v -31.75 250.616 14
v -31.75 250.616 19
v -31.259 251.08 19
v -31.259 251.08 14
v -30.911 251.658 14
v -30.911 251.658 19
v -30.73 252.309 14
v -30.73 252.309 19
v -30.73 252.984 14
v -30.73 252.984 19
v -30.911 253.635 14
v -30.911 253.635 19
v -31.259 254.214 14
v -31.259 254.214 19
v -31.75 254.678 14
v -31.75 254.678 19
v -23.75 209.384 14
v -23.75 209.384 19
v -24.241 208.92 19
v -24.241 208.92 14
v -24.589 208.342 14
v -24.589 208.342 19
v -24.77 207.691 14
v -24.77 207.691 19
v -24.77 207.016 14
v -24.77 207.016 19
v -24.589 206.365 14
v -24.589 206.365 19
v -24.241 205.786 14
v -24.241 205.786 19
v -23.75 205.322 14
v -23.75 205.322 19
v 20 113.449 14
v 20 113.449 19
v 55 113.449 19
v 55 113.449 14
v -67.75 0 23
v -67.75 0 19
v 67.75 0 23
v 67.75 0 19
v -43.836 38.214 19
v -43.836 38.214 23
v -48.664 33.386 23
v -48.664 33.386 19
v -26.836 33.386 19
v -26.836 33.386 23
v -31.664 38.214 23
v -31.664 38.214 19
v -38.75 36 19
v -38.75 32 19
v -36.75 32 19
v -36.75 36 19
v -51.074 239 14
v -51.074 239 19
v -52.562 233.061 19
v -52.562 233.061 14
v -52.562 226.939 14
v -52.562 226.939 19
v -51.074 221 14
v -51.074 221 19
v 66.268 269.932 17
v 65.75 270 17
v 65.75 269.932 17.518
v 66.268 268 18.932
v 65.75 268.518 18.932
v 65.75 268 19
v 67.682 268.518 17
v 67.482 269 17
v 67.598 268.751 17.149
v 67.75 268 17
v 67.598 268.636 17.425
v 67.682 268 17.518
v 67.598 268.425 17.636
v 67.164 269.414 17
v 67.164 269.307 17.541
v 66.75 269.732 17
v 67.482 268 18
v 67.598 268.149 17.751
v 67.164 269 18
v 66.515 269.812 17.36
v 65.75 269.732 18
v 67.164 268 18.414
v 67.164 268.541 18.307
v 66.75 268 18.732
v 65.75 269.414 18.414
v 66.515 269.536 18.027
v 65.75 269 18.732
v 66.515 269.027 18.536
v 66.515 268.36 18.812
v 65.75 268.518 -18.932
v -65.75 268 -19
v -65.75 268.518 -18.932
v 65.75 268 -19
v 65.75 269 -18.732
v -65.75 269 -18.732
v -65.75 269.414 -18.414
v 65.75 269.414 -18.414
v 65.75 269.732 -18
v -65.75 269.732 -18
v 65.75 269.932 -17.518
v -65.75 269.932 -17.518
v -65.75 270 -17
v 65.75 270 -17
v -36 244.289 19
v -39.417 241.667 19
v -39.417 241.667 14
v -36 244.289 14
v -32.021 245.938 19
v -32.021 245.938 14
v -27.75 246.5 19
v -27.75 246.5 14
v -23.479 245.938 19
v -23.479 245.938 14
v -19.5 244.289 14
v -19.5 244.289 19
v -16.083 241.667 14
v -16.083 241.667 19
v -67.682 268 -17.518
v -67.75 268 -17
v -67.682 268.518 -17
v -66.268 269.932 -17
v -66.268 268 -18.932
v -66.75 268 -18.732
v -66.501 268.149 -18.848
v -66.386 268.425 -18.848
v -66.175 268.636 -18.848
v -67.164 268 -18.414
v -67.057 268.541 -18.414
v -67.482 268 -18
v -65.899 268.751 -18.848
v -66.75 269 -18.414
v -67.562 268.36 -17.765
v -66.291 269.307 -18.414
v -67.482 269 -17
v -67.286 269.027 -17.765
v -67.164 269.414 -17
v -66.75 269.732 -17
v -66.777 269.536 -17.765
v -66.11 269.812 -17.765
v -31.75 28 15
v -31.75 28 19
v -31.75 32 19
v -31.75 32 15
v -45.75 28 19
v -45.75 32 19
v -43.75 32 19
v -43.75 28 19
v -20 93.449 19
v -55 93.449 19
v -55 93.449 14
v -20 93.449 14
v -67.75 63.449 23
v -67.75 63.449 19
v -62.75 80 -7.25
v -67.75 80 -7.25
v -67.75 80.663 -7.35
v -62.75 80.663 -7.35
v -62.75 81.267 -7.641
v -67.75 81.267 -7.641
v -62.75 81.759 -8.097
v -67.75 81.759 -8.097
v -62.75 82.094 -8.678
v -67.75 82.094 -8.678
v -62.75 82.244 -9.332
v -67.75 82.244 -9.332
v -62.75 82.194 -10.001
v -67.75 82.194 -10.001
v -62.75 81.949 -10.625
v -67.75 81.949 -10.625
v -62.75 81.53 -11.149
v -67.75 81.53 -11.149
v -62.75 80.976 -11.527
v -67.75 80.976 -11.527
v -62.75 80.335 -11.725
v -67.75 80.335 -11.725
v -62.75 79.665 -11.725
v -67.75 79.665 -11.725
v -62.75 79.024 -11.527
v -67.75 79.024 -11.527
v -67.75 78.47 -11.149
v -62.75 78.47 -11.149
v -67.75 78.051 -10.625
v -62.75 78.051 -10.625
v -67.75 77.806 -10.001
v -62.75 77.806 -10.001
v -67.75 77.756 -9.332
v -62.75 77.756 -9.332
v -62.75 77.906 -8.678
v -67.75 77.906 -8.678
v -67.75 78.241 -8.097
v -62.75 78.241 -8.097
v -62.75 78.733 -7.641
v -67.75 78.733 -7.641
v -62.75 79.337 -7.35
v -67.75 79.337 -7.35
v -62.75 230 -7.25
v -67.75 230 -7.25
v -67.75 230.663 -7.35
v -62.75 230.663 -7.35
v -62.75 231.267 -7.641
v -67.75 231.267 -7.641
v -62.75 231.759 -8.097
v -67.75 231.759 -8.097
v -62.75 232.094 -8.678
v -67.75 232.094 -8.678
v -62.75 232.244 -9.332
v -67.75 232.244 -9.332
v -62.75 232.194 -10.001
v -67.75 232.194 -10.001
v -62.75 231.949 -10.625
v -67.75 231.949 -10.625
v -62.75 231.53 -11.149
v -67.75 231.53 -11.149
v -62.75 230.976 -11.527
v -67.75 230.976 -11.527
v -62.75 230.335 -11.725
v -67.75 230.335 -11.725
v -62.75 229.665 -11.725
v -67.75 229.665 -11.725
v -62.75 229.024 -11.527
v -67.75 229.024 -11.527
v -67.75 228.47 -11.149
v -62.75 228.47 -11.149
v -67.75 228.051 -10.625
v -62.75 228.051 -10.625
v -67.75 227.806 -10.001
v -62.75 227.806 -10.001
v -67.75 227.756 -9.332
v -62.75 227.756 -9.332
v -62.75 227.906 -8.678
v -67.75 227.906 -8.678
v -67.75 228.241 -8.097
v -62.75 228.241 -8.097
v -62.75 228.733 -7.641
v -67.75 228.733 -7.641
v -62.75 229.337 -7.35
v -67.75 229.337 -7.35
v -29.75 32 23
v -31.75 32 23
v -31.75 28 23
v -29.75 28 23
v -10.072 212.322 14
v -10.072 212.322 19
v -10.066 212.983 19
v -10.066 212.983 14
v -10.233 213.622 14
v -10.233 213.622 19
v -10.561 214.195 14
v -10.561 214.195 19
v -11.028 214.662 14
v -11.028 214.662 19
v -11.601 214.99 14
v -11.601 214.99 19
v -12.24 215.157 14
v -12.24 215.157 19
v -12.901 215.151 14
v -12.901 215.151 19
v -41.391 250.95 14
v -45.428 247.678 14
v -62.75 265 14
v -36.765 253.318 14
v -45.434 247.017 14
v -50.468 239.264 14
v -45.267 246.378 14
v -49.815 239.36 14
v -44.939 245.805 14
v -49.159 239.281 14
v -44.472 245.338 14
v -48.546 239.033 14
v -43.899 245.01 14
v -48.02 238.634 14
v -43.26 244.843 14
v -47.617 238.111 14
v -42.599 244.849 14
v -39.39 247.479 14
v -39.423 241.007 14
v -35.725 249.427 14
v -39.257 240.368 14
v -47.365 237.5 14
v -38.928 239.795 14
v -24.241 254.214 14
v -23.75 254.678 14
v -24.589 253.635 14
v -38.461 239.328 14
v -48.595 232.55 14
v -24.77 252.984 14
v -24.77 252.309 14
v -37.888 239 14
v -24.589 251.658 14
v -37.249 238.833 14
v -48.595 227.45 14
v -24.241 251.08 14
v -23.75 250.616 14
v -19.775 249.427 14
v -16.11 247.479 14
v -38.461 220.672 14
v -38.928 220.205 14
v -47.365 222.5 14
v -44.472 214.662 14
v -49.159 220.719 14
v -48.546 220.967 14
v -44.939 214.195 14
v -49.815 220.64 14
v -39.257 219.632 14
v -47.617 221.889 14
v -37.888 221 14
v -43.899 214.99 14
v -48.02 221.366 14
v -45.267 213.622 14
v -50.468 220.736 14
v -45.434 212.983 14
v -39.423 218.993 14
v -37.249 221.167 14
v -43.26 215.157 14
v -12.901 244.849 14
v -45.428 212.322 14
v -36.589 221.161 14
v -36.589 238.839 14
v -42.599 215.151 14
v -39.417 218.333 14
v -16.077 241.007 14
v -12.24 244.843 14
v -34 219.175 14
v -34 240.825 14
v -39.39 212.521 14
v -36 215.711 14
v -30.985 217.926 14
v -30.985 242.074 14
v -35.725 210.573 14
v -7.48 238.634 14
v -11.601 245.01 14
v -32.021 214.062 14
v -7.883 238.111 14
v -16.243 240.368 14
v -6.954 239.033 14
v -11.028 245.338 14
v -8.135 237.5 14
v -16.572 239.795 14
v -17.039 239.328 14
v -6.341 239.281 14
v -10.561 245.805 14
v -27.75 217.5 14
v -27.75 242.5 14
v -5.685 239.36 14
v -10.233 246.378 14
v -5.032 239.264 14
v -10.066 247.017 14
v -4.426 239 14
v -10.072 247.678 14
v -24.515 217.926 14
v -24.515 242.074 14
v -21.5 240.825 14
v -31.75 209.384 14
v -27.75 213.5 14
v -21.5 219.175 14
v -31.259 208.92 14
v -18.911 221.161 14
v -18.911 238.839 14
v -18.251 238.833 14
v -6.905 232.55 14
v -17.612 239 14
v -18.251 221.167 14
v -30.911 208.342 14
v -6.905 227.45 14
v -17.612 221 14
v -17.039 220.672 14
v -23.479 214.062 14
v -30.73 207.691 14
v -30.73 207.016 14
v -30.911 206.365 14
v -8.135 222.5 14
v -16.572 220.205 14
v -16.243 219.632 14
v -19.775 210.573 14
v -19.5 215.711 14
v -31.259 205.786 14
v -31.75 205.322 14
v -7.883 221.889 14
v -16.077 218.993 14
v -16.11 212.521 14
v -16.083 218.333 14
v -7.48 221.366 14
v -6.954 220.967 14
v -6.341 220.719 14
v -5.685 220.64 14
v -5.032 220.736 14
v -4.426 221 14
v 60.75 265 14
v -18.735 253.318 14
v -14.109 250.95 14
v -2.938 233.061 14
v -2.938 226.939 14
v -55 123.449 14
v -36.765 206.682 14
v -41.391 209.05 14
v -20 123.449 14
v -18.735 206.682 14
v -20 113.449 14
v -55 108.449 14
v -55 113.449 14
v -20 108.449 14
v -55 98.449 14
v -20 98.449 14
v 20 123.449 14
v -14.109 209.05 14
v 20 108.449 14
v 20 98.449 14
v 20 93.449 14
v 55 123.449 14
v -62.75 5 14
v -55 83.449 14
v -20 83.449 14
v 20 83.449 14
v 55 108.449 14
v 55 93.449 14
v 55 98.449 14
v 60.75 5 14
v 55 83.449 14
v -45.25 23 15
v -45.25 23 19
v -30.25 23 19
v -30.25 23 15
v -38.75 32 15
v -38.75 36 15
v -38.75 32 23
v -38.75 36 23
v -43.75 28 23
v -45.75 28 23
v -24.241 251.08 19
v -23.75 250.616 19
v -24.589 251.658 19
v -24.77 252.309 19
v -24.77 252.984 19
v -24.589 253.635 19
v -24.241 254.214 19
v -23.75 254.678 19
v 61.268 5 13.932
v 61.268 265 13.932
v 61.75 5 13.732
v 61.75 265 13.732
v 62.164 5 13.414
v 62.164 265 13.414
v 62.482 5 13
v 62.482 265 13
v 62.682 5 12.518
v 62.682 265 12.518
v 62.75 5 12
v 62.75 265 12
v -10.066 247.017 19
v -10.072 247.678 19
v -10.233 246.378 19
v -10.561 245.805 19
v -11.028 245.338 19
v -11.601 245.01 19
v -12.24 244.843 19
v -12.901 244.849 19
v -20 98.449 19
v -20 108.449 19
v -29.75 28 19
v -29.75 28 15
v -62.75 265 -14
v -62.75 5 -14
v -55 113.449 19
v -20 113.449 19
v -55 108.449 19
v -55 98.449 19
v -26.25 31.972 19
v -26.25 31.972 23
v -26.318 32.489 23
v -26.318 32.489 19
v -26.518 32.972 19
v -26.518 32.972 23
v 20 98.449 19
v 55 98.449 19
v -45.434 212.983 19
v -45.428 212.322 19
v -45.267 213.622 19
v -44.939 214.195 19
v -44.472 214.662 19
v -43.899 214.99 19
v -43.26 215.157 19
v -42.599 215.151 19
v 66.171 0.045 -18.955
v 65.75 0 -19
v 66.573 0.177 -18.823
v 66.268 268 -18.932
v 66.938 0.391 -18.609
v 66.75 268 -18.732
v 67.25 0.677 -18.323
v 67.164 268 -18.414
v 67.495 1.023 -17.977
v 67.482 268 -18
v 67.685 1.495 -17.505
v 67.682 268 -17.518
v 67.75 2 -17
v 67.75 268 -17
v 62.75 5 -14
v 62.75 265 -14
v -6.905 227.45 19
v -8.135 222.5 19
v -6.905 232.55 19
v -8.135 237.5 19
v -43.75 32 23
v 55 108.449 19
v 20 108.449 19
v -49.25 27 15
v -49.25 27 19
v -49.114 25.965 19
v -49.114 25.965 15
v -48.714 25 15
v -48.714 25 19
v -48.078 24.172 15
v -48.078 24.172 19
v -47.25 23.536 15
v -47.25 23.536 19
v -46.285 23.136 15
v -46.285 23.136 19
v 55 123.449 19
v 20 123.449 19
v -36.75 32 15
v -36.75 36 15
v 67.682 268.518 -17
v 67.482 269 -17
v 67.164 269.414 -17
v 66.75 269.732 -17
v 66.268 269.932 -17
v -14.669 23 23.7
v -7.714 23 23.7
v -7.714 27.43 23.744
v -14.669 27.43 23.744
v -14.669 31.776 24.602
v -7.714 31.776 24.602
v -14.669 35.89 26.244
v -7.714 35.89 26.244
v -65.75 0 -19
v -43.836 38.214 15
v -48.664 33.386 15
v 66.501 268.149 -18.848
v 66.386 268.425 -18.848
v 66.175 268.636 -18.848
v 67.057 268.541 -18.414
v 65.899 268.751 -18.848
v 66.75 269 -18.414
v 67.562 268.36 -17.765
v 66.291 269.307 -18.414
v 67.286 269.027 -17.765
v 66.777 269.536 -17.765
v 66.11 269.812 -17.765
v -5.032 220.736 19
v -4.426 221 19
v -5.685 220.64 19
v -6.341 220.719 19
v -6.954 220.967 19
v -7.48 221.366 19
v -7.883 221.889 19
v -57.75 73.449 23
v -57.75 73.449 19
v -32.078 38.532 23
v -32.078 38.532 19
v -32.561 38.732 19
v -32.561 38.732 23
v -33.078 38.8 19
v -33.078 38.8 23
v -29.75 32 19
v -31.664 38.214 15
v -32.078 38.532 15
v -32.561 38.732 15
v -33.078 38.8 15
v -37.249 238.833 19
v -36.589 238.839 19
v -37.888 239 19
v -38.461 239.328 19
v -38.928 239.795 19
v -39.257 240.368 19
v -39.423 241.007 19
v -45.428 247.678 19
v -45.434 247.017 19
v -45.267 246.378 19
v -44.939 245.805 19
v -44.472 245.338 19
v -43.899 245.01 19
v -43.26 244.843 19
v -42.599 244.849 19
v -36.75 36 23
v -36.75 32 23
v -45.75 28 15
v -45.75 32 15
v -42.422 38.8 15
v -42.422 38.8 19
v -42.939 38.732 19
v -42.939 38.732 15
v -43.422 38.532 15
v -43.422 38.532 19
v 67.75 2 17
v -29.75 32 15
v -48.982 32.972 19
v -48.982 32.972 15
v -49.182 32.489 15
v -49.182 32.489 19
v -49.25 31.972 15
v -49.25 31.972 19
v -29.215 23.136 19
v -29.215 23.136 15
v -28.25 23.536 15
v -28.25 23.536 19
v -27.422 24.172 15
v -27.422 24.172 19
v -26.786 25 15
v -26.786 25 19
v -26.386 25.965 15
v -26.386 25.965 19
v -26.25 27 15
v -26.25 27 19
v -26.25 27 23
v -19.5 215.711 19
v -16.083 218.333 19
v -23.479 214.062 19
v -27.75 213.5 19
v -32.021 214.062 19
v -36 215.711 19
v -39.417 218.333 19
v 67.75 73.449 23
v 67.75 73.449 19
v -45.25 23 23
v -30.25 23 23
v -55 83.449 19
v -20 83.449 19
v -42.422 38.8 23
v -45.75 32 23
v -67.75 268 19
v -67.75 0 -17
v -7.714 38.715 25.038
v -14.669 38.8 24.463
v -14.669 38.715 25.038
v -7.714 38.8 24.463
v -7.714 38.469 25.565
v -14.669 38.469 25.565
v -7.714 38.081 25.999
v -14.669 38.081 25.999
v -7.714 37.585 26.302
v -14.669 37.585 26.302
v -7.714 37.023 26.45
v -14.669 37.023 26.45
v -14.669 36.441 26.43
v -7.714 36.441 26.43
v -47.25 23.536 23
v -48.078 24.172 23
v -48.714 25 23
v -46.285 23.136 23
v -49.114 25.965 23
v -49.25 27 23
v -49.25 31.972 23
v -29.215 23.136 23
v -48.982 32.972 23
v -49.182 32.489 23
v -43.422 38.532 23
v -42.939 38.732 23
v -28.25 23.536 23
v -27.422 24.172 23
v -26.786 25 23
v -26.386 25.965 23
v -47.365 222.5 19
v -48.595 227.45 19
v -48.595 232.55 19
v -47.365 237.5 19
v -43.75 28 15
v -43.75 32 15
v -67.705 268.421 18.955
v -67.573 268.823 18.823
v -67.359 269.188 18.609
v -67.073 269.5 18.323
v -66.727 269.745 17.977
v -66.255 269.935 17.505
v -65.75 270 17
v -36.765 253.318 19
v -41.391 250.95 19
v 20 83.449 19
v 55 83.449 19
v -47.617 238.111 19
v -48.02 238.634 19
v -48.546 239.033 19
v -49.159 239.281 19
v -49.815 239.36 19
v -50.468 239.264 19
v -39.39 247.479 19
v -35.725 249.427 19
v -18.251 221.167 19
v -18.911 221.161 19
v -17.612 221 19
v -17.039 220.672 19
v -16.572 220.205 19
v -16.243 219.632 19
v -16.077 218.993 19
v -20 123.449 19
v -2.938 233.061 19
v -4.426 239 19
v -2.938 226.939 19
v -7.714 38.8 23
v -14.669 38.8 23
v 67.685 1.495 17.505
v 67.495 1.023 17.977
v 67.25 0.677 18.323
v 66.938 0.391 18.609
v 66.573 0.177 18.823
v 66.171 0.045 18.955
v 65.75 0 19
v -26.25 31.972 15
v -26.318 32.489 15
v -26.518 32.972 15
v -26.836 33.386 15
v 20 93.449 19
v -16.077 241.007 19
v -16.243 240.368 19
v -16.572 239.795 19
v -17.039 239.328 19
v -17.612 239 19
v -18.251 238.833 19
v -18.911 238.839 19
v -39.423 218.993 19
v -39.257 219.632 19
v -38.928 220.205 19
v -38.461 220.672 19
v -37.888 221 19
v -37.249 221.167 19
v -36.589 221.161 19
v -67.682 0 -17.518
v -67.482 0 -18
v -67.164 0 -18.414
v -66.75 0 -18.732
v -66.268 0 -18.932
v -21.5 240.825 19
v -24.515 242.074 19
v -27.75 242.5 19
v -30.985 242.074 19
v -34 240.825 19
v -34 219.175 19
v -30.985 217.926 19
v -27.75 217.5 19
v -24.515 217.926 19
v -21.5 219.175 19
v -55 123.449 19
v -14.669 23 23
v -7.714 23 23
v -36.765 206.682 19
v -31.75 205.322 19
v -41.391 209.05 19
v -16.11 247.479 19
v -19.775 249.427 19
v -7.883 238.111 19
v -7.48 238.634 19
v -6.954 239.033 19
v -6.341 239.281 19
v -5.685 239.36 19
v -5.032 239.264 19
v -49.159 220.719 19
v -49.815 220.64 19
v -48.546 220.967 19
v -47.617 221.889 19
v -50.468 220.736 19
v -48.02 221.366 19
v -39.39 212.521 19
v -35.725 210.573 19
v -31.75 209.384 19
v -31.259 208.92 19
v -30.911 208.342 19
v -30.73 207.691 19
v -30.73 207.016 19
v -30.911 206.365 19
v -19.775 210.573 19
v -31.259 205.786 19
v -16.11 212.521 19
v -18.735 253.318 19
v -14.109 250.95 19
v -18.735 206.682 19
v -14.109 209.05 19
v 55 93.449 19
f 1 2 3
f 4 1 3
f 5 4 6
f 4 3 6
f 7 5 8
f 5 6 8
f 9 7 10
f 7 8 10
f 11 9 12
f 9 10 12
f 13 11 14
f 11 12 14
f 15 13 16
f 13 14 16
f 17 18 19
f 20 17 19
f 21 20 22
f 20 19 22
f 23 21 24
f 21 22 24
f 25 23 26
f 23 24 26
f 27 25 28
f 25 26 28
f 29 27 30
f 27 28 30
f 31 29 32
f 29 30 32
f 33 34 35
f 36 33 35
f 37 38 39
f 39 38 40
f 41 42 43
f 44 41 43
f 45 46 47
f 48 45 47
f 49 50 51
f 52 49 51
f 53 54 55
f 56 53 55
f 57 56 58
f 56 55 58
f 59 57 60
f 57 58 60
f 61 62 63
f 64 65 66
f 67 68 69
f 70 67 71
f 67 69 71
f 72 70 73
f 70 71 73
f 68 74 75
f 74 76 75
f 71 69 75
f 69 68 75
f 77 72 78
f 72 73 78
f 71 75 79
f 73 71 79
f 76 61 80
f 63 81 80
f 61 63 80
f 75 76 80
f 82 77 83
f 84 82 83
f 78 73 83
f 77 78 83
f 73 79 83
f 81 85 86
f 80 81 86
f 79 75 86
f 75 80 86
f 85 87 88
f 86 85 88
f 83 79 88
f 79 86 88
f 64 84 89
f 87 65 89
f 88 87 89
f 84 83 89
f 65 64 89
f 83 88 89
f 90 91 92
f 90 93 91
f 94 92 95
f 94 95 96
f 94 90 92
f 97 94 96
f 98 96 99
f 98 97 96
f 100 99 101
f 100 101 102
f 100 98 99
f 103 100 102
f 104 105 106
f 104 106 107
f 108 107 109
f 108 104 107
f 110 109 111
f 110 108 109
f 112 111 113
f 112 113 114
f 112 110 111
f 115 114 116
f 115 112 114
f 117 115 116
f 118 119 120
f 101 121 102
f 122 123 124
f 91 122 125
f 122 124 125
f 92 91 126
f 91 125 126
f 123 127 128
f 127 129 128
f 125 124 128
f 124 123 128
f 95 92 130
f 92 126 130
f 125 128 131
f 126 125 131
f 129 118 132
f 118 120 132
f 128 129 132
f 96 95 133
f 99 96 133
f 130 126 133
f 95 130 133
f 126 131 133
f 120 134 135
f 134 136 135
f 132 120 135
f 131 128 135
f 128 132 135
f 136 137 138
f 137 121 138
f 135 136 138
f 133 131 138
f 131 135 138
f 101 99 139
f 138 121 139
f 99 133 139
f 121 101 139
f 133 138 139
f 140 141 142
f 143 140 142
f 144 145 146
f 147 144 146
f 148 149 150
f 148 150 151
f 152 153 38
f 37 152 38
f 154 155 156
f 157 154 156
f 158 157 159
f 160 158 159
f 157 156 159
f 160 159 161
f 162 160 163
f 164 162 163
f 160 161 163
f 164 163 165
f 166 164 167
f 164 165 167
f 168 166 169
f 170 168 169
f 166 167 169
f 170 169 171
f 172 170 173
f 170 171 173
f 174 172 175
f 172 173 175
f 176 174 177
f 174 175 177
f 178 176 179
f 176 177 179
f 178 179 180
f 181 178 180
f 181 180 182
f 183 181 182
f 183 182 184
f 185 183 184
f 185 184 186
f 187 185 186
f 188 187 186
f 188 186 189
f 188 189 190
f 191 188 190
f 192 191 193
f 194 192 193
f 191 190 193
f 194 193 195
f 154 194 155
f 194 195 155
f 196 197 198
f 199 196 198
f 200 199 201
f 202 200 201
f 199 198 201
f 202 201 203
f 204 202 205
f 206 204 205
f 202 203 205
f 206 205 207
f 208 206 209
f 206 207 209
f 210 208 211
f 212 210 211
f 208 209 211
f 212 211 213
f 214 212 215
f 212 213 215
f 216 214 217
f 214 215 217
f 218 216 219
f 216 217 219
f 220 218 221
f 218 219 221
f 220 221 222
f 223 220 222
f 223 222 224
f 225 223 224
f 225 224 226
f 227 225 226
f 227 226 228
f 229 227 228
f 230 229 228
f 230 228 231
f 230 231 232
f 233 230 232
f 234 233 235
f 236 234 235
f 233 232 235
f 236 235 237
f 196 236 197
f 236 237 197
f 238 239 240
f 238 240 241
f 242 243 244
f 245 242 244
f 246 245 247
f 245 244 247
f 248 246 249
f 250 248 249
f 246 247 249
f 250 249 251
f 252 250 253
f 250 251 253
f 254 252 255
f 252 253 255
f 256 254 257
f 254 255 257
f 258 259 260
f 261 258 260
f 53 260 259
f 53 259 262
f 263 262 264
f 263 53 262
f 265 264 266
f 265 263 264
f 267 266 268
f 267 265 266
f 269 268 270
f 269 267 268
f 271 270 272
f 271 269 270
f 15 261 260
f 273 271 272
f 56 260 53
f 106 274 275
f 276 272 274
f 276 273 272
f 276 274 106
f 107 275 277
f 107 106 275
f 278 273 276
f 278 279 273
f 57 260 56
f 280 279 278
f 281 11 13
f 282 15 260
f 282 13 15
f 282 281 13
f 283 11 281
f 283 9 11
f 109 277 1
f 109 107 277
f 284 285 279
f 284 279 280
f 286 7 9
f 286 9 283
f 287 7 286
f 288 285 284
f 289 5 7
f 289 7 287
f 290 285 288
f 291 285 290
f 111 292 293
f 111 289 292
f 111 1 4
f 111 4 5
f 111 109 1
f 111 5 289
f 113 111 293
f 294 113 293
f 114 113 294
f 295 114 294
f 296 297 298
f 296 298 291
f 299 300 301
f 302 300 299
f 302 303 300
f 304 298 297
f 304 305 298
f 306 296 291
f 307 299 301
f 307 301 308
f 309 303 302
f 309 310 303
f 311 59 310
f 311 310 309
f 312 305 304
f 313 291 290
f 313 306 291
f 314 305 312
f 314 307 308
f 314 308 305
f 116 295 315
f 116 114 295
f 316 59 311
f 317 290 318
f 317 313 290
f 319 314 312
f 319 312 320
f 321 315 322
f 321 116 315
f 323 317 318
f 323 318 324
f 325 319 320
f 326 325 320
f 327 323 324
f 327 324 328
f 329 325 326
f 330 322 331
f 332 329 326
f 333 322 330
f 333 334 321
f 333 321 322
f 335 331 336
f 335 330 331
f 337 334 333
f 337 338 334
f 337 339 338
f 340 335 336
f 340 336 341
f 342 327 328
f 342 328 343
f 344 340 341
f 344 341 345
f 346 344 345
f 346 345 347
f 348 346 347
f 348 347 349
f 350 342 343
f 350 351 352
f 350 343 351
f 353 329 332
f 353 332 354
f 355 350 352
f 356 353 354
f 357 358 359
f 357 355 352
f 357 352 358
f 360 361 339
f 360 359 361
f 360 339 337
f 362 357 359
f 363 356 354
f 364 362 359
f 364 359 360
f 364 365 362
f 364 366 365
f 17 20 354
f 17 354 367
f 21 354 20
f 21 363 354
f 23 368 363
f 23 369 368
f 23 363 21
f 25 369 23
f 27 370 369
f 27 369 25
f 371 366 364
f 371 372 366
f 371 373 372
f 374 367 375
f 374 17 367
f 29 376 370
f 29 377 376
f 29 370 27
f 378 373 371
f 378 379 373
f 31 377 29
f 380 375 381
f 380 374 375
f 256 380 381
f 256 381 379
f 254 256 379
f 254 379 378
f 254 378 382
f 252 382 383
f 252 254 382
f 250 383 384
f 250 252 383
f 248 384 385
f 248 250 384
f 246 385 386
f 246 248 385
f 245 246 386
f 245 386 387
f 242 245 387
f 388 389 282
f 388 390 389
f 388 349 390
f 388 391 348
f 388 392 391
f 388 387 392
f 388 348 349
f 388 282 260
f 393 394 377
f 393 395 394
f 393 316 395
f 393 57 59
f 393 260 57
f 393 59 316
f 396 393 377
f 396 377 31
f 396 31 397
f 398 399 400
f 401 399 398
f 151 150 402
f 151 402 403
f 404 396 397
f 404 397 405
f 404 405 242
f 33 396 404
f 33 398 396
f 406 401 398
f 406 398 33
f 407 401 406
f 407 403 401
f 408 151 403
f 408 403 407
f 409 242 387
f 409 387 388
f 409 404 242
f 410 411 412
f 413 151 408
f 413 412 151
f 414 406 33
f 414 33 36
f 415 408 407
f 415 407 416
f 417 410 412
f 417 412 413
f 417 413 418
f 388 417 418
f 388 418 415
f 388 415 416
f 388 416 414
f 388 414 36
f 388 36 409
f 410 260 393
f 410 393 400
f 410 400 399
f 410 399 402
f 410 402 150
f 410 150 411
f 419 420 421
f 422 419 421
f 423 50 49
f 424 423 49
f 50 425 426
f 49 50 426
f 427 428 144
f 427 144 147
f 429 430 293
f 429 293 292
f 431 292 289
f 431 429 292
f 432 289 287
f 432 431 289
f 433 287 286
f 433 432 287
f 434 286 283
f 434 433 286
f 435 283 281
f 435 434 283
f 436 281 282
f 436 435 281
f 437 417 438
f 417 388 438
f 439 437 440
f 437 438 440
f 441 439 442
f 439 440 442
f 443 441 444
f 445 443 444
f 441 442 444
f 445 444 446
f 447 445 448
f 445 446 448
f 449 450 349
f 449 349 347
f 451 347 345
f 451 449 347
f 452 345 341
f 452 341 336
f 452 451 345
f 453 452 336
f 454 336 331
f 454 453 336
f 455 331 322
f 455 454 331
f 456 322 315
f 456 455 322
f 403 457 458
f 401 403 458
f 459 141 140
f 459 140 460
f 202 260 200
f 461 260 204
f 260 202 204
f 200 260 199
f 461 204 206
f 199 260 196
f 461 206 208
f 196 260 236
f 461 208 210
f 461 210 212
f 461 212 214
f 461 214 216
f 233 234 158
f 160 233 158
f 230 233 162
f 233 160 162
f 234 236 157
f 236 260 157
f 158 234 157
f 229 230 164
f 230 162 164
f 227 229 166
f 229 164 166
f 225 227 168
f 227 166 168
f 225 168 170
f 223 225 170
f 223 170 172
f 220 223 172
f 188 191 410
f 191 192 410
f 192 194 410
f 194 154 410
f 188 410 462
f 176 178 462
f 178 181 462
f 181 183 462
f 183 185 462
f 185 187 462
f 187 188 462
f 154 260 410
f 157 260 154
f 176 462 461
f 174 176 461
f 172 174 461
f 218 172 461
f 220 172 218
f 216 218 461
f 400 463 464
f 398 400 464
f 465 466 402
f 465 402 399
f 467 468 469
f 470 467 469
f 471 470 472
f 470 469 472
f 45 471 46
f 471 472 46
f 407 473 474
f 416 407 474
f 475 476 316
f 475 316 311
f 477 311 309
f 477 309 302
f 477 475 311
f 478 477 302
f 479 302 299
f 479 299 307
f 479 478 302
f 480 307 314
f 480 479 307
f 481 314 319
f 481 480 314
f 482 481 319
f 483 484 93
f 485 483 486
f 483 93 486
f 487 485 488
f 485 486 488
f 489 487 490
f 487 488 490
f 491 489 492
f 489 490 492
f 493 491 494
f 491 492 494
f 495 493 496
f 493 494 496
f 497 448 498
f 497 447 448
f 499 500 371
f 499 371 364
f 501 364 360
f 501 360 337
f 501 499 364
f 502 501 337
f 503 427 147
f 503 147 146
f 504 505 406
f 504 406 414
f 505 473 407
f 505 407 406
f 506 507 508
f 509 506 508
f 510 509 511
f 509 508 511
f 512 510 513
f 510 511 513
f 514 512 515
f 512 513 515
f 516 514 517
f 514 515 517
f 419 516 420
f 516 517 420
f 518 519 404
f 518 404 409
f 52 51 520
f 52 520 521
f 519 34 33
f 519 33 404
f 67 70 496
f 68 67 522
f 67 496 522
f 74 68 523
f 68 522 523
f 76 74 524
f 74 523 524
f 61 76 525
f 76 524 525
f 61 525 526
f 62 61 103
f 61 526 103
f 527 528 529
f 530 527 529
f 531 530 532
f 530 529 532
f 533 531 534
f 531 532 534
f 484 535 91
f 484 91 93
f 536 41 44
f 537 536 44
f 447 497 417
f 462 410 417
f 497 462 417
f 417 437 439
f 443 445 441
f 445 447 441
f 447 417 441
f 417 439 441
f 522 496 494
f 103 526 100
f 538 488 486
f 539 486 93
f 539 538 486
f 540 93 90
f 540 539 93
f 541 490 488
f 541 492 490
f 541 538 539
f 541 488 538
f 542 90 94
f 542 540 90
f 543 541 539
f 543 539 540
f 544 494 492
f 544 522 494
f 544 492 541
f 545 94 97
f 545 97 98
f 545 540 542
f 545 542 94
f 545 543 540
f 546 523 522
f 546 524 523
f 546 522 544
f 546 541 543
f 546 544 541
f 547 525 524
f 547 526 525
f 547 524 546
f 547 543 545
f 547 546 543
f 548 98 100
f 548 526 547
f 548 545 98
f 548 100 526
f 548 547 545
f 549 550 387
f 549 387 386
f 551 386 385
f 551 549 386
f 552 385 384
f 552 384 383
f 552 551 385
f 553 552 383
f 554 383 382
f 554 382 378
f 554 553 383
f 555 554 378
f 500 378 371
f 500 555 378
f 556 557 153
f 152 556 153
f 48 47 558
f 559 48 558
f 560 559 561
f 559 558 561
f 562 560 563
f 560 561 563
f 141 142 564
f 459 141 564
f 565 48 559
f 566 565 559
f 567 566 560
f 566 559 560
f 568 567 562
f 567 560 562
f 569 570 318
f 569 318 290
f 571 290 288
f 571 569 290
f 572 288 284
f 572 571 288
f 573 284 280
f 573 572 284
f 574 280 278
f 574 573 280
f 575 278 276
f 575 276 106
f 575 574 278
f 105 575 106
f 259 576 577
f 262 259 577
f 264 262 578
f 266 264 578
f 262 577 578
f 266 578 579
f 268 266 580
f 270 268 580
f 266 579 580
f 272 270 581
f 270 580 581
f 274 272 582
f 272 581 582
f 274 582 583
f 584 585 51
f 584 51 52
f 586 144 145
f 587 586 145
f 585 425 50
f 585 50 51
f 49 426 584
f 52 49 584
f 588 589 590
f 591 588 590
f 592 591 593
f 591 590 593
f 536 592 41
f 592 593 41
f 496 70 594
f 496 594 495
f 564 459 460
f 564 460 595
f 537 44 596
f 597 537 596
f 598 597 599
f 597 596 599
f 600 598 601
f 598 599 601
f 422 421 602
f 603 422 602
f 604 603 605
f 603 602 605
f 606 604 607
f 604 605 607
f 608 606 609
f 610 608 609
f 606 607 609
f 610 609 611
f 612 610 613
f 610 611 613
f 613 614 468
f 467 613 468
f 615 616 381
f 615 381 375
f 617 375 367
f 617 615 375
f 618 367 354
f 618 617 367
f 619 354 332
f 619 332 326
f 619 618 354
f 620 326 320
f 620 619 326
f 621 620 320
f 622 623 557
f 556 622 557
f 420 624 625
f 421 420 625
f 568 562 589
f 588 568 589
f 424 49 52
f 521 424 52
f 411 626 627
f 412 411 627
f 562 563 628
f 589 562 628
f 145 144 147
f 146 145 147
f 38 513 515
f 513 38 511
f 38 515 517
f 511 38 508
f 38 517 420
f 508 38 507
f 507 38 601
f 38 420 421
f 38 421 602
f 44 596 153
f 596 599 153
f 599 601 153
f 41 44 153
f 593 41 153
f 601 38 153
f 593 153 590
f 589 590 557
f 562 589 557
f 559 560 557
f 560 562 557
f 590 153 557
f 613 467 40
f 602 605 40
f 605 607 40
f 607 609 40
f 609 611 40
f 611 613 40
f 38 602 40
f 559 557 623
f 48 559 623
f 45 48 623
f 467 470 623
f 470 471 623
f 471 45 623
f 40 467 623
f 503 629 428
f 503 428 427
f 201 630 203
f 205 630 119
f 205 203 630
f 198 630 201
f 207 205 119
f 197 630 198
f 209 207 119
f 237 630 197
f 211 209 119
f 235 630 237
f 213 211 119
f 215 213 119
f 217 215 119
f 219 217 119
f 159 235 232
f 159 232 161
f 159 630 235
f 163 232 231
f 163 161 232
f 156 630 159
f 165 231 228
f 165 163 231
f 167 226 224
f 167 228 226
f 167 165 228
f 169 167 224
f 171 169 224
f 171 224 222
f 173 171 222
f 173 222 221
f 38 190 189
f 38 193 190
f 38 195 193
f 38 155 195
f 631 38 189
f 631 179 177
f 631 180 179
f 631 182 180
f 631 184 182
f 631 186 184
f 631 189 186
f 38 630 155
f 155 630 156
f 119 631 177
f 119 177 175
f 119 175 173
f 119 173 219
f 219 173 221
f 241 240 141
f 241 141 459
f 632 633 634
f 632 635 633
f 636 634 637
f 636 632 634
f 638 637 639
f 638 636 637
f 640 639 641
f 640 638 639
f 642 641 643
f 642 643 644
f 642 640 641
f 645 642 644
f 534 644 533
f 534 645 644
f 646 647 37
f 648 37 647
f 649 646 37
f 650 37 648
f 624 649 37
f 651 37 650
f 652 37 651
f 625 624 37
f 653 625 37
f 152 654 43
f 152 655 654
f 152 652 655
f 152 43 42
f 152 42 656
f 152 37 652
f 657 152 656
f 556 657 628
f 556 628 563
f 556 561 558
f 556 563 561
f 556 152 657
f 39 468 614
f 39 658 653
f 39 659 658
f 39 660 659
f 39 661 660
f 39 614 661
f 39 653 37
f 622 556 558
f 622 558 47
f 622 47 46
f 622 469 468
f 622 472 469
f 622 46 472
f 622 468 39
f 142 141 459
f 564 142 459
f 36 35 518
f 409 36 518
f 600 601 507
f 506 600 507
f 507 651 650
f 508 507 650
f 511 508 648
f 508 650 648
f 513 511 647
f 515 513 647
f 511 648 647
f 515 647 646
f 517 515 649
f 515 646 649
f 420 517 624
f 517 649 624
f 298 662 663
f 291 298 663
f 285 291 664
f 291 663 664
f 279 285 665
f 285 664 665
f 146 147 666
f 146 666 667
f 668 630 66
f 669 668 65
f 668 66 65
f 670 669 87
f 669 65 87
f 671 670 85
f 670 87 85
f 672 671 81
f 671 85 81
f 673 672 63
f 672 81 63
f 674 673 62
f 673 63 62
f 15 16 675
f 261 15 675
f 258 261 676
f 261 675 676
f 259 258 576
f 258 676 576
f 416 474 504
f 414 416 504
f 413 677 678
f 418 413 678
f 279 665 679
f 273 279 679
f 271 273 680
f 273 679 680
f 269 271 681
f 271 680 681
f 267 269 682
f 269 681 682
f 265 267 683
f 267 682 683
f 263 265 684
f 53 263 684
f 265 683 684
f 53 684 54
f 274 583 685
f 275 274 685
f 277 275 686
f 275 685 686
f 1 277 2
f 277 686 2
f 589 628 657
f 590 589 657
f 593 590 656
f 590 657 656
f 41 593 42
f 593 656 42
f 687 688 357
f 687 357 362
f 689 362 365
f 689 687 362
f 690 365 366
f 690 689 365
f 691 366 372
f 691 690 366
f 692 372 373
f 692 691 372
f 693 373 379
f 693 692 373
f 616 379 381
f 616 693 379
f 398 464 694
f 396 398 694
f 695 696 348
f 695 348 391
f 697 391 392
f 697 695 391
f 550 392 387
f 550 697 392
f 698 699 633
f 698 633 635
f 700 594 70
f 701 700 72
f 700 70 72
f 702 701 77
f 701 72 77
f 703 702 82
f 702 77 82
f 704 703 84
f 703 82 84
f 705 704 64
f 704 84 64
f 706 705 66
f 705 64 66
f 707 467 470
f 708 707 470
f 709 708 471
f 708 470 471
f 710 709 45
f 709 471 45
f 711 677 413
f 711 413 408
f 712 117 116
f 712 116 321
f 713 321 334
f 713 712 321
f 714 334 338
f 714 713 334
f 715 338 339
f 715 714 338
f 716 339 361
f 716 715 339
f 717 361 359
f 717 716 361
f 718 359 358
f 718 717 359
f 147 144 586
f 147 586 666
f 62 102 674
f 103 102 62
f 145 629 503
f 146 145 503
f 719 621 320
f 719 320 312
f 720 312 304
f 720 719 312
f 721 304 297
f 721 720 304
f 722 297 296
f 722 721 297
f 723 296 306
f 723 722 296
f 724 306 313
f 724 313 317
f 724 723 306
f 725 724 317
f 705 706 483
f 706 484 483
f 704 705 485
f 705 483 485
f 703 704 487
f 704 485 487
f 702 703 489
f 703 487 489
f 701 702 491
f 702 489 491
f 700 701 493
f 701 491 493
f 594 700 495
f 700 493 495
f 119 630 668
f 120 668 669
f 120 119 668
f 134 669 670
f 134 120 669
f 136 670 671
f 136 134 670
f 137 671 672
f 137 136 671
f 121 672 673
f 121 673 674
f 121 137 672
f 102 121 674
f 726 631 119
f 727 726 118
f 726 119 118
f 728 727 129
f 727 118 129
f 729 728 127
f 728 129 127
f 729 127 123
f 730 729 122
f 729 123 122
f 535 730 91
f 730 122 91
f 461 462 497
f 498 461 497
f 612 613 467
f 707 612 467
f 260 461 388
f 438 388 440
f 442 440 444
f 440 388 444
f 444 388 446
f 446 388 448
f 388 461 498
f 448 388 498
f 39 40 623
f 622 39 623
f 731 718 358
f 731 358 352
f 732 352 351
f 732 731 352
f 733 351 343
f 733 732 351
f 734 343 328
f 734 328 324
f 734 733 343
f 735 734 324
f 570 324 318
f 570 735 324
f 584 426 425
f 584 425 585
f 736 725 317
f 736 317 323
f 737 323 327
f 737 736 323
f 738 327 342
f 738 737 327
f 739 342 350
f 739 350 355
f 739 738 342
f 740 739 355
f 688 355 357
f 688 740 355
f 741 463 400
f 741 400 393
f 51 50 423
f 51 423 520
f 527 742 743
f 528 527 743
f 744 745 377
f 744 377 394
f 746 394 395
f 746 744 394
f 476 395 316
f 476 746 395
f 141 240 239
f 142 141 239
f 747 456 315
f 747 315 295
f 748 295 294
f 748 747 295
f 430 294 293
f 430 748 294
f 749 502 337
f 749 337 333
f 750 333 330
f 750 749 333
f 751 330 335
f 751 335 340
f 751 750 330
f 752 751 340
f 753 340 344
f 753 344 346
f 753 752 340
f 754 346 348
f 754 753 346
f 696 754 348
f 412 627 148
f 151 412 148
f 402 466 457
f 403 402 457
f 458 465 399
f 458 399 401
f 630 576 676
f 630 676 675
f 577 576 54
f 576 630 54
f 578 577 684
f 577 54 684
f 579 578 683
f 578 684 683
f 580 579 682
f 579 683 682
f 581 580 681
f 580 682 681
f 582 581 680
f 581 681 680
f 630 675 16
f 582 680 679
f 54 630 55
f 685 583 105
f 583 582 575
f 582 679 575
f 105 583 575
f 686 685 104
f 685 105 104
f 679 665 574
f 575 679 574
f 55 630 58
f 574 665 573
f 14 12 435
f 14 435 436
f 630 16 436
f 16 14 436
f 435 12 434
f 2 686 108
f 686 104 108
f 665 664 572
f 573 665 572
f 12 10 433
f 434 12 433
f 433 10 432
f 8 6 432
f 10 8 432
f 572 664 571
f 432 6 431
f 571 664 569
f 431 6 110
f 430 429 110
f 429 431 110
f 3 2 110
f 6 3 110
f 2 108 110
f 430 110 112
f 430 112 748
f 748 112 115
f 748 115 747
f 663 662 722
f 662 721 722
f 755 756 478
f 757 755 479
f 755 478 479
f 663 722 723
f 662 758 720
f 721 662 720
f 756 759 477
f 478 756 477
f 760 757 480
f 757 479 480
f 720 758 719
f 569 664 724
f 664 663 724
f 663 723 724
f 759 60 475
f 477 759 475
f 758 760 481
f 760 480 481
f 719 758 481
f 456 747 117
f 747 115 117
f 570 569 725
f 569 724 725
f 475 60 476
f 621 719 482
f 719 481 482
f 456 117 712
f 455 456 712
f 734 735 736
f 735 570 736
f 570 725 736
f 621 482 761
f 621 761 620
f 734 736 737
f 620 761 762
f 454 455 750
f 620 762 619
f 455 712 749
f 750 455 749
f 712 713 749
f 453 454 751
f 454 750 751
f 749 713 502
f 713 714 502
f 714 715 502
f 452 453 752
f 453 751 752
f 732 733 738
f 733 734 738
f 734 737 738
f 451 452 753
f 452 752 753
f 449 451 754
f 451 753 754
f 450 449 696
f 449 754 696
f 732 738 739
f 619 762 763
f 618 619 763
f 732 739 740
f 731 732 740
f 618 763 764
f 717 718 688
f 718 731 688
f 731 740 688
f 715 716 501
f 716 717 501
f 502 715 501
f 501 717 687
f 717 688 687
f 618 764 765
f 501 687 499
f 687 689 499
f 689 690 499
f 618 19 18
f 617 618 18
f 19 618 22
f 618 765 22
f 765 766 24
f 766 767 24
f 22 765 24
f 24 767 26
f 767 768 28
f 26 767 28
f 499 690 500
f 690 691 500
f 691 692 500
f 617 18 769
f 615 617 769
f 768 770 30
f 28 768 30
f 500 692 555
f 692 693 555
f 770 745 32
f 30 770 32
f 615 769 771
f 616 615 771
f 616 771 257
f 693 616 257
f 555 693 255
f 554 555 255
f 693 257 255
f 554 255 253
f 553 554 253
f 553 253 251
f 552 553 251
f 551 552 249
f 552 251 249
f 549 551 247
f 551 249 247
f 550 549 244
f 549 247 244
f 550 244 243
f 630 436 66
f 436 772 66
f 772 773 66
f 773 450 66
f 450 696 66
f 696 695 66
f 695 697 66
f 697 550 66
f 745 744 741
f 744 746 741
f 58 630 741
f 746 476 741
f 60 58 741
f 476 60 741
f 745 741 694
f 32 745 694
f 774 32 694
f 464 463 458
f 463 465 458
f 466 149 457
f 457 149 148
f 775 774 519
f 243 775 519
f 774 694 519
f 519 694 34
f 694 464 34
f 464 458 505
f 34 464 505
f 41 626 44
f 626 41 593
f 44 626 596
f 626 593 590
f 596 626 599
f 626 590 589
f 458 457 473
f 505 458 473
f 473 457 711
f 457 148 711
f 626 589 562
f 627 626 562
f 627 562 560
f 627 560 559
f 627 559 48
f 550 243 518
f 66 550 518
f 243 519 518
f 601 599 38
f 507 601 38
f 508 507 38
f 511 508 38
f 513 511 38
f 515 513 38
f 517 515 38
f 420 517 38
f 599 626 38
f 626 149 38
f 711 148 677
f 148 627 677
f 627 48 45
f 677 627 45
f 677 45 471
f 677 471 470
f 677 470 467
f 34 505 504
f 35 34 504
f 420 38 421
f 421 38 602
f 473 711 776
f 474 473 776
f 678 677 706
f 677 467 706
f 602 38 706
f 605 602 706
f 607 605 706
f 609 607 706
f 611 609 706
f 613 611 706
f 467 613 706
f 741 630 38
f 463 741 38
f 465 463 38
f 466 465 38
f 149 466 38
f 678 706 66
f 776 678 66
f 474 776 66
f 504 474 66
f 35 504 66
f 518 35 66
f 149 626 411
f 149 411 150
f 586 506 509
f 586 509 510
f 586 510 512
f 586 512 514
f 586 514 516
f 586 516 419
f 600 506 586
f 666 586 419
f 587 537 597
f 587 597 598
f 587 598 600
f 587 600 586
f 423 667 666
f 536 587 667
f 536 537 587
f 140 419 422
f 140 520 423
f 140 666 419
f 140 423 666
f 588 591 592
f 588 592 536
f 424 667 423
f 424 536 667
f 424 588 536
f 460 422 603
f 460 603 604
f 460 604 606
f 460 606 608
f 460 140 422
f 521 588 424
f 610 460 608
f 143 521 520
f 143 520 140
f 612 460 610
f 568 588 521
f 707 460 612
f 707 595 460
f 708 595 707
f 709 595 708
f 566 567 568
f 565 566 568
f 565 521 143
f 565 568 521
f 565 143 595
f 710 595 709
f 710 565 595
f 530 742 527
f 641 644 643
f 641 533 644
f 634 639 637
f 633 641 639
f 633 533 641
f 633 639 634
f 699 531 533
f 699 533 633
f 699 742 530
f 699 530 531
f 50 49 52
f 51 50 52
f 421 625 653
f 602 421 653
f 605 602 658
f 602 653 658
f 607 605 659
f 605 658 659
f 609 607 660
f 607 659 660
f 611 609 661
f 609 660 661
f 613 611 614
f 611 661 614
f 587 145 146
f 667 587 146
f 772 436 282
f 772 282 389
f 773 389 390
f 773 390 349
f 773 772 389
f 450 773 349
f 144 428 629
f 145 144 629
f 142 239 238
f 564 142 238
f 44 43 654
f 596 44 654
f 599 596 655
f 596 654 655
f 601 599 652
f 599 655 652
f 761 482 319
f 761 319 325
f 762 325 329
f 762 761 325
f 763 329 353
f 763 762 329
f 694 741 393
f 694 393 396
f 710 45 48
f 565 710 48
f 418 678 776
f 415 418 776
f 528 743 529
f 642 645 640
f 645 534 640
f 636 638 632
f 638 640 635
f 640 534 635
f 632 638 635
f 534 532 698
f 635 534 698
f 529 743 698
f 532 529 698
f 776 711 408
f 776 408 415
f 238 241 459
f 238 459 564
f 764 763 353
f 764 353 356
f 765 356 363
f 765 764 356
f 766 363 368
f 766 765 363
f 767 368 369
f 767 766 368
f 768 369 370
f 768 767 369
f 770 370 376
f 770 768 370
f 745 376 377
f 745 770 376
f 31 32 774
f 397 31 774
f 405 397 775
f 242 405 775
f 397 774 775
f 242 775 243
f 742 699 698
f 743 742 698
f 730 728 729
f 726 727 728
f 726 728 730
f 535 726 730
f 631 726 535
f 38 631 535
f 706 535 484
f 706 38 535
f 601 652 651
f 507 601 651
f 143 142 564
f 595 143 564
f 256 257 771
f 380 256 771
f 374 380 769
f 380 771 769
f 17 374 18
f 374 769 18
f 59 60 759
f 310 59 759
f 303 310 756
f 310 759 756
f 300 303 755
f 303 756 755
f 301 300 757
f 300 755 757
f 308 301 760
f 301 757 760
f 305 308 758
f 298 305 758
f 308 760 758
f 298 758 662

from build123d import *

# Parameters (mm, degrees)
SKETCH1_W           = 135.5
SKETCH1_H           = 38
BOSS_EXTRUDE1_DEPTH = 270
BOSS_EXTRUDE2_DEPTH = 4
SHELL2_T            = -5
SKETCH4_W           = 125.5
SKETCH4_H           = 28
BOSS_EXTRUDE3_DEPTH = 5
CUT_EXTRUDE1_DEPTH  = 5
CUT_EXTRUDE2_DEPTH  = 5
SKETCH7_W           = 35
SKETCH7_H           = 10
CUT_EXTRUDE3_DEPTH  = 5
FILLET1_R           = 2
SKETCH8_W           = 2
SKETCH8_H           = 4
CUT_EXTRUDE4_DEPTH  = 8
SKETCH9_W           = 6.95582013
SKETCH9_H           = 15.8
BOSS_EXTRUDE5_DEPTH = 5
SKETCH11_R          = 2.25
CUT_EXTRUDE6_DEPTH  = 5
CUT_EXTRUDE7_DEPTH  = 282.742345704
FILLET2_R           = 2


with BuildPart() as part:
    # Sketch1 → Boss-Extrude1 (new body)
    with BuildSketch(Plane(origin=(0, 0, 0), x_dir=(1, 0, 0), z_dir=(0, 1, 0))):
        Rectangle(SKETCH1_W, SKETCH1_H)
    extrude(amount=BOSS_EXTRUDE1_DEPTH)

    # Shell2
    shell2_openings = [part.faces().sort_by_distance(p)[0] for p in [
        (0, 0, 0),
    ]]
    offset(amount=SHELL2_T, openings=shell2_openings, kind=Kind.INTERSECTION)

    # Sketch4 → Boss-Extrude3 (add)
    with BuildSketch(Plane.XZ):
        Rectangle(SKETCH4_W, SKETCH4_H)
    extrude(amount=-BOSS_EXTRUDE3_DEPTH)

    # Sketch5 → Cut-Extrude1 (cut)
    with BuildSketch(Plane.XY.offset(19)):
        with BuildLine():
            ThreePointArc((-51.073807579, 239), (-52.75, 230), (-51.073807579, 221))
            ThreePointArc((-51.073807579, 221), (-48.844330346, 220.822571892), (-47.365045246, 222.5))
            ThreePointArc((-47.365045246, 222.5), (-48.75, 230), (-47.365045246, 237.5))
            ThreePointArc((-47.365045246, 237.5), (-48.844330346, 239.177428108), (-51.073807579, 239))
        make_face()
        with BuildLine():
            ThreePointArc((-45.42766953, 247.67766953), (-44.720562748, 245.556349186), (-42.599242405, 244.849242405))
            ThreePointArc((-42.599242405, 244.849242405), (-37.605759614, 248.54357038), (-31.75, 250.615528128))
            ThreePointArc((-31.75, 250.615528128), (-30.707474592, 252.646726743), (-31.75, 254.677925359))
            ThreePointArc((-31.75, 254.677925359), (-39.139962005, 252.254634698), (-45.42766953, 247.67766953))
        make_face()
        with BuildLine():
            ThreePointArc((-10.07233047, 247.67766953), (-10.779437252, 245.556349186), (-12.900757595, 244.849242405))
            ThreePointArc((-12.900757595, 244.849242405), (-17.894240386, 248.54357038), (-23.75, 250.615528128))
            ThreePointArc((-23.75, 250.615528128), (-24.792525408, 252.646726743), (-23.75, 254.677925359))
            ThreePointArc((-23.75, 254.677925359), (-16.360037995, 252.254634698), (-10.07233047, 247.67766953))
        make_face()
        with BuildLine():
            ThreePointArc((-45.42766953, 212.32233047), (-44.720562748, 214.443650814), (-42.599242405, 215.150757595))
            ThreePointArc((-42.599242405, 215.150757595), (-37.605759614, 211.45642962), (-31.75, 209.384471872))
            ThreePointArc((-31.75, 209.384471872), (-30.707474592, 207.353273257), (-31.75, 205.322074641))
            ThreePointArc((-31.75, 205.322074641), (-39.139962005, 207.745365302), (-45.42766953, 212.32233047))
        make_face()
        with BuildLine():
            ThreePointArc((-10.07233047, 212.32233047), (-10.779437252, 214.443650814), (-12.900757595, 215.150757595))
            ThreePointArc((-12.900757595, 215.150757595), (-17.894240386, 211.45642962), (-23.75, 209.384471872))
            ThreePointArc((-23.75, 209.384471872), (-24.792525408, 207.353273257), (-23.75, 205.322074641))
            ThreePointArc((-23.75, 205.322074641), (-16.360037995, 207.745365302), (-10.07233047, 212.32233047))
        make_face()
        with BuildLine():
            ThreePointArc((-4.426192421, 221), (-6.655669654, 220.822571892), (-8.134954754, 222.5))
            ThreePointArc((-8.134954754, 222.5), (-6.75, 230), (-8.134954754, 237.5))
            ThreePointArc((-8.134954754, 237.5), (-6.655669654, 239.177428108), (-4.426192421, 239))
            ThreePointArc((-4.426192421, 239), (-2.75, 230), (-4.426192421, 221))
        make_face()
    extrude(amount=-CUT_EXTRUDE1_DEPTH, mode=Mode.SUBTRACT)

    # Sketch6 → Cut-Extrude2 (cut)
    with BuildSketch(Plane.XY.offset(19)):
        with BuildLine():
            ThreePointArc((-36.588834765, 221.161165235), (-27.75, 217.5), (-18.911165235, 221.161165235))
            ThreePointArc((-18.911165235, 221.161165235), (-16.789844892, 220.454058454), (-16.08273811, 218.33273811))
            ThreePointArc((-16.08273811, 218.33273811), (-27.75, 213.5), (-39.41726189, 218.33273811))
            ThreePointArc((-39.41726189, 218.33273811), (-38.710155108, 220.454058454), (-36.588834765, 221.161165235))
        make_face()
        with BuildLine():
            ThreePointArc((-16.08273811, 241.66726189), (-16.789844892, 239.545941546), (-18.911165235, 238.838834765))
            ThreePointArc((-18.911165235, 238.838834765), (-27.75, 242.5), (-36.588834765, 238.838834765))
            ThreePointArc((-36.588834765, 238.838834765), (-38.710155108, 239.545941546), (-39.41726189, 241.66726189))
            ThreePointArc((-39.41726189, 241.66726189), (-27.75, 246.5), (-16.08273811, 241.66726189))
        make_face()
    extrude(amount=-CUT_EXTRUDE2_DEPTH, mode=Mode.SUBTRACT)

    # Sketch7 → Cut-Extrude3 (cut)
    with BuildSketch(Plane.XY.offset(19)):
        with Locations((37.5, 88.449332994)):
            Rectangle(SKETCH7_W, SKETCH7_H)
        with Locations((-37.5, 88.449332994)):
            Rectangle(SKETCH7_W, SKETCH7_H)
        with Locations((-37.5, 103.449332994)):
            Rectangle(SKETCH7_W, SKETCH7_H)
        with Locations((37.5, 103.449332994)):
            Rectangle(SKETCH7_W, SKETCH7_H)
        with Locations((-37.5, 118.449332994)):
            Rectangle(SKETCH7_W, SKETCH7_H)
        with Locations((37.5, 118.449332994)):
            Rectangle(SKETCH7_W, SKETCH7_H)
    extrude(amount=-CUT_EXTRUDE3_DEPTH, mode=Mode.SUBTRACT)

    # Fillet1
    fillet1_edges = [part.edges().sort_by_distance(p)[0] for p in [
        (-67.75, 270, 0),
        (62.75, 135, 14),
        (0, 270, 19),
        (67.75, 270, 0),
        (67.75, 0, 0),
        (67.75, 135, 19),
        (-67.75, 135, -19),
        (67.75, 135, -19),
        (0, 270, -19),
    ]]
    fillet(fillet1_edges, radius=FILLET1_R)


with BuildPart() as body_2:
    # Sketch3 → Boss-Extrude2 (new body)
    with BuildSketch(Plane.XY.offset(19)):
        Polygon((-67.75, 0), (67.75, 0), (67.75, 73.449332994), (-57.75, 73.449332994), (-67.75, 63.449332994), align=None)
    extrude(amount=BOSS_EXTRUDE2_DEPTH)


with BuildPart() as cut_extrude4_tool:
    # Sketch8 → Cut-Extrude4 (new body)
    with BuildSketch(Plane.XY.offset(23)):
        with BuildLine():
            Line((-45.25, 23), (-30.25, 23))
            ThreePointArc((-30.25, 23), (-27.421572875, 24.171572875), (-26.25, 27))
            Line((-26.25, 27), (-26.25, 31.971572875))
            ThreePointArc((-26.25, 31.971572875), (-26.402240935, 32.73693974), (-26.835786438, 33.385786438))
            Line((-26.835786438, 33.385786438), (-31.664213562, 38.214213562))
            ThreePointArc((-31.664213562, 38.214213562), (-32.31306026, 38.647759065), (-33.078427125, 38.8))
            Line((-33.078427125, 38.8), (-42.421572875, 38.8))
            ThreePointArc((-42.421572875, 38.8), (-43.18693974, 38.647759065), (-43.835786438, 38.214213562))
            Line((-43.835786438, 38.214213562), (-48.664213562, 33.385786438))
            ThreePointArc((-48.664213562, 33.385786438), (-49.097759065, 32.73693974), (-49.25, 31.971572875))
            Line((-49.25, 31.971572875), (-49.25, 27))
            ThreePointArc((-49.25, 27), (-48.078427125, 24.171572875), (-45.25, 23))
        make_face()
        with Locations((-37.75, 34)):
            Rectangle(SKETCH8_W, SKETCH8_H, mode=Mode.SUBTRACT)
        with Locations((-44.75, 30)):
            Rectangle(SKETCH8_W, SKETCH8_H, mode=Mode.SUBTRACT)
        with Locations((-30.75, 30)):
            Rectangle(SKETCH8_W, SKETCH8_H, mode=Mode.SUBTRACT)
    extrude(amount=-CUT_EXTRUDE4_DEPTH)


with BuildPart() as part_1:
    add(part.part)

    # Cut-Extrude4: cut by cut_extrude4_tool
    add(cut_extrude4_tool.part, mode=Mode.SUBTRACT)

    # Sketch11 → Cut-Extrude6 (cut)
    with BuildSketch(Plane.ZY.offset(67.75)):
        with Locations((-9.5, 230)):
            Circle(SKETCH11_R)
        with Locations((-9.5, 80)):
            Circle(SKETCH11_R)
    extrude(amount=-CUT_EXTRUDE6_DEPTH, mode=Mode.SUBTRACT)


with BuildPart() as body_2_1:
    add(body_2.part)

    # Cut-Extrude4: cut by cut_extrude4_tool
    add(cut_extrude4_tool.part, mode=Mode.SUBTRACT)


with BuildPart() as body_3:
    # Sketch9 → Boss-Extrude5 (new body)
    with BuildSketch(Plane.XY.offset(23)):
        with Locations((-11.191473213, 30.9)):
            Rectangle(SKETCH9_W, SKETCH9_H)
    extrude(amount=BOSS_EXTRUDE5_DEPTH)

    # Sketch10 → Cut-Extrude7 (cut, through all)
    with BuildSketch(Plane(origin=(-7.713563148, 0, 0), x_dir=(0, 0, -1), z_dir=(1, 0, 0))):
        with BuildLine():
            Line((-28, 38.8), (-28, 23))
            Line((-28, 23), (-23.7, 23))
            ThreePointArc((-23.7, 23), (-24.46083461, 31.278063998), (-28, 38.8))
        make_face()
    extrude(amount=-CUT_EXTRUDE7_DEPTH, mode=Mode.SUBTRACT)

    # Fillet2
    fillet2_edges = [body_3.edges().sort_by_distance(p)[0] for p in [
        (-11.191473213, 38.8, 28),
    ]]
    fillet(fillet2_edges, radius=FILLET2_R)


solid = Compound([part_1.part, body_2_1.part, body_3.part])
